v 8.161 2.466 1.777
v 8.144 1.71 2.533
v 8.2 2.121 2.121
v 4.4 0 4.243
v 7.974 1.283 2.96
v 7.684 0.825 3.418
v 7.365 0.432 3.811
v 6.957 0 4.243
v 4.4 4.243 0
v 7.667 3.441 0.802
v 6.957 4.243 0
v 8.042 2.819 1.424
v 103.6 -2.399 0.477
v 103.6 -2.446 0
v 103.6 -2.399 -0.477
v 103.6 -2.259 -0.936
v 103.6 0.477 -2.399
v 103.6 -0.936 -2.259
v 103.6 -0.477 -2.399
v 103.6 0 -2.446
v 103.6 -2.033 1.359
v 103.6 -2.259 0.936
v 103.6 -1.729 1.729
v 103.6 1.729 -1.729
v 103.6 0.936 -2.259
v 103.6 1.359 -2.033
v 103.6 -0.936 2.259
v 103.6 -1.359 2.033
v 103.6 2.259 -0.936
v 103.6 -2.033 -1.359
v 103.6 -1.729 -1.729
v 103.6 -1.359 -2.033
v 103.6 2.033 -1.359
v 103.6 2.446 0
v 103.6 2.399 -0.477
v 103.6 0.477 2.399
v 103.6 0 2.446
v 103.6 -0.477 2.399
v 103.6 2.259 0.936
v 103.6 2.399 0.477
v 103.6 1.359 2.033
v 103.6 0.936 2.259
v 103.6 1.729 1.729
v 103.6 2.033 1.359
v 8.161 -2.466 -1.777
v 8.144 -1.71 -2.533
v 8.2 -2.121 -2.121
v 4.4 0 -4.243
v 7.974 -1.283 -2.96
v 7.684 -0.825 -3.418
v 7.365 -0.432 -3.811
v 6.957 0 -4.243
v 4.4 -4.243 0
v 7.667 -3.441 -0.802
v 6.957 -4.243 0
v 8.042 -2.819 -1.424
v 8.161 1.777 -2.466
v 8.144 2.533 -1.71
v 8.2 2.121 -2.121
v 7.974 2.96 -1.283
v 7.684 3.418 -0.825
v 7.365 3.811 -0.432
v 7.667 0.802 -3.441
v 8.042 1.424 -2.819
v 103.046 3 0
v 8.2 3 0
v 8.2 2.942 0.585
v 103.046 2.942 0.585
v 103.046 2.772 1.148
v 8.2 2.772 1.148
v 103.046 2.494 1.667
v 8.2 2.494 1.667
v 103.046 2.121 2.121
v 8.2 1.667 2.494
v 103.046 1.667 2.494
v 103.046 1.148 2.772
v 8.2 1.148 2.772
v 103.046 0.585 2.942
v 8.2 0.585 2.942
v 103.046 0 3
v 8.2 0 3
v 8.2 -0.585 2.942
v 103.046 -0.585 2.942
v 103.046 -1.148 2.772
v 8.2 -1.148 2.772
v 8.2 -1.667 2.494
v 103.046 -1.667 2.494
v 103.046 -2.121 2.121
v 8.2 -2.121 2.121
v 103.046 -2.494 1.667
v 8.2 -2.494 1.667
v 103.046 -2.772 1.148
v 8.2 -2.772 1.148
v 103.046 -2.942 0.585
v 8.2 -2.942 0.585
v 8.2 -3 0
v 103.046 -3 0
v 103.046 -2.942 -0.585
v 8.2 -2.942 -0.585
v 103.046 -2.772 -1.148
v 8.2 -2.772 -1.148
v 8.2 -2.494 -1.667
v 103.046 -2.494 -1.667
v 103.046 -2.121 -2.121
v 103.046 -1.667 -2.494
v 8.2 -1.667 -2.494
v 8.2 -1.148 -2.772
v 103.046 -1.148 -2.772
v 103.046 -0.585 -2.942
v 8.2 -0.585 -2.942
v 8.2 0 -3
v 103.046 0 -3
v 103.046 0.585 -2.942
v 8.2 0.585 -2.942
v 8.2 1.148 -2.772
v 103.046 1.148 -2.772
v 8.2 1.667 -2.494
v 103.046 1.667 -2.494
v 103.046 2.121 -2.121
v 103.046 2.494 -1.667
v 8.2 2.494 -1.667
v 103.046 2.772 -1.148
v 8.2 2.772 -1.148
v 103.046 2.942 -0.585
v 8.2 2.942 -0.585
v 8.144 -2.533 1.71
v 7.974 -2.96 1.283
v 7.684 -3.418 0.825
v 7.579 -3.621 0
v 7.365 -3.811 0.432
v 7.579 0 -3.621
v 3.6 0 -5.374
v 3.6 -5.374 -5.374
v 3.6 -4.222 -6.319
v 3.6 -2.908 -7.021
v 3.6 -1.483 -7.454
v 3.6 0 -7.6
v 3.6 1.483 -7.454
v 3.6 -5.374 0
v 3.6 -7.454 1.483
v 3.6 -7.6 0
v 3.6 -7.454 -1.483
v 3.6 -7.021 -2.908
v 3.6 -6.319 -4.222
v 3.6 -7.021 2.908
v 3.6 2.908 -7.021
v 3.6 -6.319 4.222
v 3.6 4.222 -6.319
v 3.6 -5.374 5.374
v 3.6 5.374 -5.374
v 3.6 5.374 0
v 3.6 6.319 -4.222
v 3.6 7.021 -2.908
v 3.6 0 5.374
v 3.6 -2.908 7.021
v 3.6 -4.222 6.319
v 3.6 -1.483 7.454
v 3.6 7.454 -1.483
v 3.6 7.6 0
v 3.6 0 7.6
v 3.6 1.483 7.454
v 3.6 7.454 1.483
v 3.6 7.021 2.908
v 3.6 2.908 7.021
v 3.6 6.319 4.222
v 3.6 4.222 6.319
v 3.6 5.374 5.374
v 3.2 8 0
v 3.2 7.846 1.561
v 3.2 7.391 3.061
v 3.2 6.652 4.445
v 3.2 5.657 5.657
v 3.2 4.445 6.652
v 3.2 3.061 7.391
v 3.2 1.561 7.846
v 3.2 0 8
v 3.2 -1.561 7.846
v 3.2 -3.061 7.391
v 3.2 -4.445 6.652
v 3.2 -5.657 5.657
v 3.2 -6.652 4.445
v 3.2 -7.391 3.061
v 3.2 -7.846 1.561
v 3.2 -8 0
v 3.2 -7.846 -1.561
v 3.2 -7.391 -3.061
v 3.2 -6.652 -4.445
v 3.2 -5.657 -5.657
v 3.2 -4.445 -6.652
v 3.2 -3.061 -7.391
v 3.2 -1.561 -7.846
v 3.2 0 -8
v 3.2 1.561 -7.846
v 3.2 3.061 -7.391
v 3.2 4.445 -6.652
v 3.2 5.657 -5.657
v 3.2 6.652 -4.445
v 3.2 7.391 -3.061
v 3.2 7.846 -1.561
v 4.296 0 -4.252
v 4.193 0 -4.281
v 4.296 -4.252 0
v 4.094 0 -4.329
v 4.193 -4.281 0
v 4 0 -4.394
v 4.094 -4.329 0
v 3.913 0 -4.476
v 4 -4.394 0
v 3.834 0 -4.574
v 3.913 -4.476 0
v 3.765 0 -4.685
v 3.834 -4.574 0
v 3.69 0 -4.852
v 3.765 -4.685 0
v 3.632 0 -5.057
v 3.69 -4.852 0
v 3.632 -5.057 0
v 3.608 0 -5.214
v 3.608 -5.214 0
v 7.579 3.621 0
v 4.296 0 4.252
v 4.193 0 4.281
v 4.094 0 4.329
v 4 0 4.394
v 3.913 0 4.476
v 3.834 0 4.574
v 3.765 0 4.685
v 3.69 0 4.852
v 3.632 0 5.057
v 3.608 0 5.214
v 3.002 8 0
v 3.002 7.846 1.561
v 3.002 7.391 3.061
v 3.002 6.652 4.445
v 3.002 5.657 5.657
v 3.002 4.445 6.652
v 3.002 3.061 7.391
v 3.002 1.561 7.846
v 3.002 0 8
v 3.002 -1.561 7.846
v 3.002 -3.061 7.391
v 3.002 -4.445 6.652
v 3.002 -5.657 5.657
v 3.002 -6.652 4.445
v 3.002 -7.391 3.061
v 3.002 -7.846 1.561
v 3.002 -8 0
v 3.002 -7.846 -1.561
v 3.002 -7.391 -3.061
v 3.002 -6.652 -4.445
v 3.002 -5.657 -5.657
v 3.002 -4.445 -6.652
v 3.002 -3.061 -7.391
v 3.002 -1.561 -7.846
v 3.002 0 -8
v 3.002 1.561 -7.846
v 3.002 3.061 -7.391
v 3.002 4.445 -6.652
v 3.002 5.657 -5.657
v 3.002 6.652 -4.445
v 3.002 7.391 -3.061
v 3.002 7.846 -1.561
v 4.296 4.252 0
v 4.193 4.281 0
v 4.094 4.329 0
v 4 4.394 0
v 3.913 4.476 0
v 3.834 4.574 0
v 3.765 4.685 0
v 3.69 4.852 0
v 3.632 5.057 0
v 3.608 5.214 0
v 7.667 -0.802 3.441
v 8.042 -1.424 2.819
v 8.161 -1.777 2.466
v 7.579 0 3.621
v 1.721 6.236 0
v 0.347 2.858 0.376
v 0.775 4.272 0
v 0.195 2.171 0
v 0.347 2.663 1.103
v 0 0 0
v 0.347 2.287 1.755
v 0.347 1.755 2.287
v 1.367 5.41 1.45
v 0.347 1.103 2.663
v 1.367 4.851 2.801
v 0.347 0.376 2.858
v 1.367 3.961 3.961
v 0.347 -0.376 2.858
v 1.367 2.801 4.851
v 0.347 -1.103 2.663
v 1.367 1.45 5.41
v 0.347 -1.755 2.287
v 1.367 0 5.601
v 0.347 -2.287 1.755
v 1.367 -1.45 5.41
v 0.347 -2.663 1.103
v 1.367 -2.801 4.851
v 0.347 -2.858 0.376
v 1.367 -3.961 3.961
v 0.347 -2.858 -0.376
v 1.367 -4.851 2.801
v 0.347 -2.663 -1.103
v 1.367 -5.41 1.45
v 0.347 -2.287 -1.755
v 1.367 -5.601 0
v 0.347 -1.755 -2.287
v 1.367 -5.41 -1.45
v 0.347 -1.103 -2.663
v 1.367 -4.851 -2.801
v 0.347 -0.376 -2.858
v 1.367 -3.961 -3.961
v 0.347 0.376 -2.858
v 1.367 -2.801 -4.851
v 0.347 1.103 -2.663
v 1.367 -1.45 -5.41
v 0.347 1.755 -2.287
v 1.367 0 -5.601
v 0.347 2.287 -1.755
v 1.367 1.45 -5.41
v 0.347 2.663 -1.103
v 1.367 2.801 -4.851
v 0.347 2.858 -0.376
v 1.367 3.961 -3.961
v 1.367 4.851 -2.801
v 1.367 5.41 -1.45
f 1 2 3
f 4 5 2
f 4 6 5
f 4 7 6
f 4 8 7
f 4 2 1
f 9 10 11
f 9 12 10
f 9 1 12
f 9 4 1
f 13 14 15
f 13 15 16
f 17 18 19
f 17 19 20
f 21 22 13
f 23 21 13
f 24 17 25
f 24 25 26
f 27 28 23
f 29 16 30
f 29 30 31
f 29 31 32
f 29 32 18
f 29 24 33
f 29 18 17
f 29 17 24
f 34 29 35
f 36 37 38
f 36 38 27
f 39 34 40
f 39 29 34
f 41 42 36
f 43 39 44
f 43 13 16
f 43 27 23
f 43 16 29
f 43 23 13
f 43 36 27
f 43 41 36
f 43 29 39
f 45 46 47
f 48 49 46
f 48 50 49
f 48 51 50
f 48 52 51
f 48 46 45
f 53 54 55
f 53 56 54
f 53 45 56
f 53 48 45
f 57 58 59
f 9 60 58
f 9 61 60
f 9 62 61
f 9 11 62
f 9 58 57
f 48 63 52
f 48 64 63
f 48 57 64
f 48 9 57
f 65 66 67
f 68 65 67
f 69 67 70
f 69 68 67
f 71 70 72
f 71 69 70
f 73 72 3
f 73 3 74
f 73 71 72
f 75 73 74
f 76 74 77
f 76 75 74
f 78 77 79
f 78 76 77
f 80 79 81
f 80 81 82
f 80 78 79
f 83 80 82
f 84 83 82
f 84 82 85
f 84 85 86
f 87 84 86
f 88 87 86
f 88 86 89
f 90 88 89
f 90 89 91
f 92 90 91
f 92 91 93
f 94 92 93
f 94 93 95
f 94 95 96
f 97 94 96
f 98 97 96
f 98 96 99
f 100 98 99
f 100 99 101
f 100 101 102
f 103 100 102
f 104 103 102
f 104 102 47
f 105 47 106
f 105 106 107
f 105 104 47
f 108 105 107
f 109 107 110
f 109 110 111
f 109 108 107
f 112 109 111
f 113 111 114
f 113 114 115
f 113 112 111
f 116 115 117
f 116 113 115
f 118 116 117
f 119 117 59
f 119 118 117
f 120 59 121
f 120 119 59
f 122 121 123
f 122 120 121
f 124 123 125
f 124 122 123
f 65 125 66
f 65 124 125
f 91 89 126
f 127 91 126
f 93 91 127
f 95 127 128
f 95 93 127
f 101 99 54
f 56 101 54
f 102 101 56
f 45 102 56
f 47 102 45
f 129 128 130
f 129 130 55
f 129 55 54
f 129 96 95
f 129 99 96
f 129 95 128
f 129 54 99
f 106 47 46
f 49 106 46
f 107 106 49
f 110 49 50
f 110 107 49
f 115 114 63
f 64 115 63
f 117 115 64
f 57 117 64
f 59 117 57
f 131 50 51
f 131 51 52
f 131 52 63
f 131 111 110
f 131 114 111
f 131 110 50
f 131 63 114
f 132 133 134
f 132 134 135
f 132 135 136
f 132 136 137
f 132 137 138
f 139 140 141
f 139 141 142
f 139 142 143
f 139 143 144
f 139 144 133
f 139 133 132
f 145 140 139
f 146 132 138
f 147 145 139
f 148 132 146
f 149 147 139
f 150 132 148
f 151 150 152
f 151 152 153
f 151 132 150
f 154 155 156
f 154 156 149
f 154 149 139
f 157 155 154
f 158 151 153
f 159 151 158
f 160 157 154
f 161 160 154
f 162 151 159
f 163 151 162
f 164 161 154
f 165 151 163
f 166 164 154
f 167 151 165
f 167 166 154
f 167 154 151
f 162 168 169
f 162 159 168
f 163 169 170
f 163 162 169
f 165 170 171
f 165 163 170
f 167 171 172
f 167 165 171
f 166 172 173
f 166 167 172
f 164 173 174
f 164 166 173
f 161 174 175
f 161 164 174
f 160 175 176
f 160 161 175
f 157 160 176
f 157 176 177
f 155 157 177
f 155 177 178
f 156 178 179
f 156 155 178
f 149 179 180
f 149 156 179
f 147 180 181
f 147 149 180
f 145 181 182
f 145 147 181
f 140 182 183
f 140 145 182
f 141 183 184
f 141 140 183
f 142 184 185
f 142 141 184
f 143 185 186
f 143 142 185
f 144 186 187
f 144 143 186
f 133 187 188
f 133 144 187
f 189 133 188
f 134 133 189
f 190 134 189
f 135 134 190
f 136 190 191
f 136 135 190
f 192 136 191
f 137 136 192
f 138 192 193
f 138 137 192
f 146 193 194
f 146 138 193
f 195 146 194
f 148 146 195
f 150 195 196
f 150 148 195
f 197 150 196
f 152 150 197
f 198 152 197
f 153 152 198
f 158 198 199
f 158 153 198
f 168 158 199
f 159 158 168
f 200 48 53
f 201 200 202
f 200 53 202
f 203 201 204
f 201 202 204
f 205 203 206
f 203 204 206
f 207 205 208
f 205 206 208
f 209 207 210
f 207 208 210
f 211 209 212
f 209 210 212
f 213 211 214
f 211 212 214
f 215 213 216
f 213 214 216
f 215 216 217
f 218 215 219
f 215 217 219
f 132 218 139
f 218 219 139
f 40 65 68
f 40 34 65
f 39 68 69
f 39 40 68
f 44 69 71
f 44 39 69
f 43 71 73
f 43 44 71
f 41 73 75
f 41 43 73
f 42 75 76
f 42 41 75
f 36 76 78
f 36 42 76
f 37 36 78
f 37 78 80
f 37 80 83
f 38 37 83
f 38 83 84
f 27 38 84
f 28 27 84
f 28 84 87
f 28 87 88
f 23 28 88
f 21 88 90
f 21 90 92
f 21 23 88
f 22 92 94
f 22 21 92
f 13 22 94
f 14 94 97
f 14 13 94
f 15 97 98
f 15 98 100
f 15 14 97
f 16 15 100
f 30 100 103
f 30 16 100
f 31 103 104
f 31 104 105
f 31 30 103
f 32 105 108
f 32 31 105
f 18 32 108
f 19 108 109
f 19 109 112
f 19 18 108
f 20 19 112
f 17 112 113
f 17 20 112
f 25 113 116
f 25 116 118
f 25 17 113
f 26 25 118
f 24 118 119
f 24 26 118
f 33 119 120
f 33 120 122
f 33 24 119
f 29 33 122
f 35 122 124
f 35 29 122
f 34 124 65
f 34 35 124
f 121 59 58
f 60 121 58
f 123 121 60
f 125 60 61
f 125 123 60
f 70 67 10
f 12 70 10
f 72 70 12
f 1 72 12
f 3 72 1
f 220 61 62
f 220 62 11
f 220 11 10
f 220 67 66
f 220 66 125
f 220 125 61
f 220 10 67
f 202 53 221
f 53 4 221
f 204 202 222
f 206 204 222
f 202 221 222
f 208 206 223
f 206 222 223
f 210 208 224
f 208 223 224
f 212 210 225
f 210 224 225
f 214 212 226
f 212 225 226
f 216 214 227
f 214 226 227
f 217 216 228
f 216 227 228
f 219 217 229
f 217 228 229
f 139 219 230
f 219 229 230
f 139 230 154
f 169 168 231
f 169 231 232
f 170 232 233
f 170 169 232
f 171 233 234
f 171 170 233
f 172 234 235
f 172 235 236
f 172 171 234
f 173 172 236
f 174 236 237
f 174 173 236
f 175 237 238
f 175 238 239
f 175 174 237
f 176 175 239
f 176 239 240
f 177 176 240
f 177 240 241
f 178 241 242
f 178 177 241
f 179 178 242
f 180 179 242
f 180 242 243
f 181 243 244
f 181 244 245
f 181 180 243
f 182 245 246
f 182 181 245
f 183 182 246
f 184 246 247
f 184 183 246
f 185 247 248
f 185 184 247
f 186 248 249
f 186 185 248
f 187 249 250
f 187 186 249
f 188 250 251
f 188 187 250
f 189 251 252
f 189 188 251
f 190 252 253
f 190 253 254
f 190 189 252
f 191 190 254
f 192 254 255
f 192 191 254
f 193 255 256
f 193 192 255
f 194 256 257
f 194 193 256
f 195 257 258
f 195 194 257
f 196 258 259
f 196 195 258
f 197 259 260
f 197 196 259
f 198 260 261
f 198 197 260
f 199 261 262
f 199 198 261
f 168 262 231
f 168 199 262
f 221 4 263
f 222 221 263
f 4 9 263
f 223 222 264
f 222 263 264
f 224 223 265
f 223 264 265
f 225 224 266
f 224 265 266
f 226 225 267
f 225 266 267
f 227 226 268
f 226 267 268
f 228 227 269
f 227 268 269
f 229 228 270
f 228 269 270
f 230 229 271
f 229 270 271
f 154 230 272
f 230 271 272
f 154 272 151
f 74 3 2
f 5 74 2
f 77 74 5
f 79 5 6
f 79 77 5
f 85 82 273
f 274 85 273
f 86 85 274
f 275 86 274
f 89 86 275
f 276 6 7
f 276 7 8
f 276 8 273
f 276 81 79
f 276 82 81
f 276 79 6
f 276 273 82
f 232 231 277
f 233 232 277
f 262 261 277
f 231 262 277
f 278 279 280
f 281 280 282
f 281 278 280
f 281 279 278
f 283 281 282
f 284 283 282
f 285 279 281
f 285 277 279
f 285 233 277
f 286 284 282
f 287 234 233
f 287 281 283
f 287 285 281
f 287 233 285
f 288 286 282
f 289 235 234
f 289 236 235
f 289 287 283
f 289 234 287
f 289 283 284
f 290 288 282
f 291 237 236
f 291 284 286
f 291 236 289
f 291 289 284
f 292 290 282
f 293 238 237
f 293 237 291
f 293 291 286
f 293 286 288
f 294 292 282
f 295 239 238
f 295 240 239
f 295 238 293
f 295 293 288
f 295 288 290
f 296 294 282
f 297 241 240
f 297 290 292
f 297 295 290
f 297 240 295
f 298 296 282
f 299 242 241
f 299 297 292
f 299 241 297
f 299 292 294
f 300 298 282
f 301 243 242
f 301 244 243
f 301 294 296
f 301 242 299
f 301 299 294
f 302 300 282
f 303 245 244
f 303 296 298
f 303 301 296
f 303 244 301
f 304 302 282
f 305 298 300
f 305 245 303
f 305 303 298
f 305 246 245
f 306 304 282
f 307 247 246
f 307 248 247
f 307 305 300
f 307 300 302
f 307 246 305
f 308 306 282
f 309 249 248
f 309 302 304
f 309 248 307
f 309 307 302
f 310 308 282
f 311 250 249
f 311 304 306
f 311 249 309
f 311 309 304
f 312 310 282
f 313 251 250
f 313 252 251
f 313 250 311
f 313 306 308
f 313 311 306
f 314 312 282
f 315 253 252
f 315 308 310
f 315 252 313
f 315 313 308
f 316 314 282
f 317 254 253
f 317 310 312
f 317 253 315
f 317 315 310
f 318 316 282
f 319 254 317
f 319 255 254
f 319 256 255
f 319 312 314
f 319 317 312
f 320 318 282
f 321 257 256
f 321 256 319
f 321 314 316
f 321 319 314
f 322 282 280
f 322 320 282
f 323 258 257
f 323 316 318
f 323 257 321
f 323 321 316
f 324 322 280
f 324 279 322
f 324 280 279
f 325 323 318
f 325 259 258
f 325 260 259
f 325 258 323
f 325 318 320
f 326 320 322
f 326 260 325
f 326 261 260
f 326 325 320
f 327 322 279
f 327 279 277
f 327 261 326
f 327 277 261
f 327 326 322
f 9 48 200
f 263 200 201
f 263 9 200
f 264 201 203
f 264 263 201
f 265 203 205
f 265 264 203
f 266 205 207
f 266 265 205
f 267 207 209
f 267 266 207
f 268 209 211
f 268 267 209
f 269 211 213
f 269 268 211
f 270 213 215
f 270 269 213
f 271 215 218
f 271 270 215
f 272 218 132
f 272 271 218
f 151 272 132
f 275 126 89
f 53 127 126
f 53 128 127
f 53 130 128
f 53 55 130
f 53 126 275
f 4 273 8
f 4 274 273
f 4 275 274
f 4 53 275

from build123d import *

# Parameters (mm, degrees)
BOSS_EXTRUDE1_DEPTH = 4.6
FILLET1_R           = 0.8


with BuildPart() as part:
    # BodySke → Base-Revolve (revolve)
    with BuildSketch(Plane.XY):
        with BuildLine():
            Line((3.0024, 8), (3.6, 8))
            Line((3.6, 8), (3.6, 3))
            Line((3.6, 3), (103.0455, 3))
            Line((103.0455, 3), (103.6, 2.4455))
            Line((103.6, 2.4455), (103.6, 0))
            Line((103.6, 0), (0, 0))
            ThreePointArc((0, 0), (0.775318389, 4.272423369), (3.0024, 8))
        make_face()
    revolve(axis=Axis((-31.75, 0, 0), (1, 0, 0)))

    # Sketch1 → Boss-Extrude1 (add)
    with BuildSketch(Plane(origin=(3.6, 0, 0), x_dir=(0, 0, -1), z_dir=(1, 0, 0))):
        Polygon((0, 4.242640687), (4.242640687, 0), (0, -4.242640687), (-4.242640687, 0), align=None)
    extrude(amount=BOSS_EXTRUDE1_DEPTH)

    # Sketch2 → Cut-Revolve1 (revolve, cut)
    with BuildSketch(Plane.XY):
        Polygon((8.2, 3), (13.2, 3), (13.2, 9), (2.2, 9), align=None)
    revolve(axis=Axis((0, 0, 0), (1, 0, 0)), mode=Mode.SUBTRACT)

    # Fillet1
    fillet1_edges = [part.edges().sort_by_distance(p)[0] for p in [
        (3.6, 2.121320344, -2.121320344),
        (3.6, -2.121320344, -2.121320344),
        (3.6, 2.121320344, 2.121320344),
        (3.6, -2.121320344, 2.121320344),
    ]]
    fillet(fillet1_edges, radius=FILLET1_R)


solid = part.part
